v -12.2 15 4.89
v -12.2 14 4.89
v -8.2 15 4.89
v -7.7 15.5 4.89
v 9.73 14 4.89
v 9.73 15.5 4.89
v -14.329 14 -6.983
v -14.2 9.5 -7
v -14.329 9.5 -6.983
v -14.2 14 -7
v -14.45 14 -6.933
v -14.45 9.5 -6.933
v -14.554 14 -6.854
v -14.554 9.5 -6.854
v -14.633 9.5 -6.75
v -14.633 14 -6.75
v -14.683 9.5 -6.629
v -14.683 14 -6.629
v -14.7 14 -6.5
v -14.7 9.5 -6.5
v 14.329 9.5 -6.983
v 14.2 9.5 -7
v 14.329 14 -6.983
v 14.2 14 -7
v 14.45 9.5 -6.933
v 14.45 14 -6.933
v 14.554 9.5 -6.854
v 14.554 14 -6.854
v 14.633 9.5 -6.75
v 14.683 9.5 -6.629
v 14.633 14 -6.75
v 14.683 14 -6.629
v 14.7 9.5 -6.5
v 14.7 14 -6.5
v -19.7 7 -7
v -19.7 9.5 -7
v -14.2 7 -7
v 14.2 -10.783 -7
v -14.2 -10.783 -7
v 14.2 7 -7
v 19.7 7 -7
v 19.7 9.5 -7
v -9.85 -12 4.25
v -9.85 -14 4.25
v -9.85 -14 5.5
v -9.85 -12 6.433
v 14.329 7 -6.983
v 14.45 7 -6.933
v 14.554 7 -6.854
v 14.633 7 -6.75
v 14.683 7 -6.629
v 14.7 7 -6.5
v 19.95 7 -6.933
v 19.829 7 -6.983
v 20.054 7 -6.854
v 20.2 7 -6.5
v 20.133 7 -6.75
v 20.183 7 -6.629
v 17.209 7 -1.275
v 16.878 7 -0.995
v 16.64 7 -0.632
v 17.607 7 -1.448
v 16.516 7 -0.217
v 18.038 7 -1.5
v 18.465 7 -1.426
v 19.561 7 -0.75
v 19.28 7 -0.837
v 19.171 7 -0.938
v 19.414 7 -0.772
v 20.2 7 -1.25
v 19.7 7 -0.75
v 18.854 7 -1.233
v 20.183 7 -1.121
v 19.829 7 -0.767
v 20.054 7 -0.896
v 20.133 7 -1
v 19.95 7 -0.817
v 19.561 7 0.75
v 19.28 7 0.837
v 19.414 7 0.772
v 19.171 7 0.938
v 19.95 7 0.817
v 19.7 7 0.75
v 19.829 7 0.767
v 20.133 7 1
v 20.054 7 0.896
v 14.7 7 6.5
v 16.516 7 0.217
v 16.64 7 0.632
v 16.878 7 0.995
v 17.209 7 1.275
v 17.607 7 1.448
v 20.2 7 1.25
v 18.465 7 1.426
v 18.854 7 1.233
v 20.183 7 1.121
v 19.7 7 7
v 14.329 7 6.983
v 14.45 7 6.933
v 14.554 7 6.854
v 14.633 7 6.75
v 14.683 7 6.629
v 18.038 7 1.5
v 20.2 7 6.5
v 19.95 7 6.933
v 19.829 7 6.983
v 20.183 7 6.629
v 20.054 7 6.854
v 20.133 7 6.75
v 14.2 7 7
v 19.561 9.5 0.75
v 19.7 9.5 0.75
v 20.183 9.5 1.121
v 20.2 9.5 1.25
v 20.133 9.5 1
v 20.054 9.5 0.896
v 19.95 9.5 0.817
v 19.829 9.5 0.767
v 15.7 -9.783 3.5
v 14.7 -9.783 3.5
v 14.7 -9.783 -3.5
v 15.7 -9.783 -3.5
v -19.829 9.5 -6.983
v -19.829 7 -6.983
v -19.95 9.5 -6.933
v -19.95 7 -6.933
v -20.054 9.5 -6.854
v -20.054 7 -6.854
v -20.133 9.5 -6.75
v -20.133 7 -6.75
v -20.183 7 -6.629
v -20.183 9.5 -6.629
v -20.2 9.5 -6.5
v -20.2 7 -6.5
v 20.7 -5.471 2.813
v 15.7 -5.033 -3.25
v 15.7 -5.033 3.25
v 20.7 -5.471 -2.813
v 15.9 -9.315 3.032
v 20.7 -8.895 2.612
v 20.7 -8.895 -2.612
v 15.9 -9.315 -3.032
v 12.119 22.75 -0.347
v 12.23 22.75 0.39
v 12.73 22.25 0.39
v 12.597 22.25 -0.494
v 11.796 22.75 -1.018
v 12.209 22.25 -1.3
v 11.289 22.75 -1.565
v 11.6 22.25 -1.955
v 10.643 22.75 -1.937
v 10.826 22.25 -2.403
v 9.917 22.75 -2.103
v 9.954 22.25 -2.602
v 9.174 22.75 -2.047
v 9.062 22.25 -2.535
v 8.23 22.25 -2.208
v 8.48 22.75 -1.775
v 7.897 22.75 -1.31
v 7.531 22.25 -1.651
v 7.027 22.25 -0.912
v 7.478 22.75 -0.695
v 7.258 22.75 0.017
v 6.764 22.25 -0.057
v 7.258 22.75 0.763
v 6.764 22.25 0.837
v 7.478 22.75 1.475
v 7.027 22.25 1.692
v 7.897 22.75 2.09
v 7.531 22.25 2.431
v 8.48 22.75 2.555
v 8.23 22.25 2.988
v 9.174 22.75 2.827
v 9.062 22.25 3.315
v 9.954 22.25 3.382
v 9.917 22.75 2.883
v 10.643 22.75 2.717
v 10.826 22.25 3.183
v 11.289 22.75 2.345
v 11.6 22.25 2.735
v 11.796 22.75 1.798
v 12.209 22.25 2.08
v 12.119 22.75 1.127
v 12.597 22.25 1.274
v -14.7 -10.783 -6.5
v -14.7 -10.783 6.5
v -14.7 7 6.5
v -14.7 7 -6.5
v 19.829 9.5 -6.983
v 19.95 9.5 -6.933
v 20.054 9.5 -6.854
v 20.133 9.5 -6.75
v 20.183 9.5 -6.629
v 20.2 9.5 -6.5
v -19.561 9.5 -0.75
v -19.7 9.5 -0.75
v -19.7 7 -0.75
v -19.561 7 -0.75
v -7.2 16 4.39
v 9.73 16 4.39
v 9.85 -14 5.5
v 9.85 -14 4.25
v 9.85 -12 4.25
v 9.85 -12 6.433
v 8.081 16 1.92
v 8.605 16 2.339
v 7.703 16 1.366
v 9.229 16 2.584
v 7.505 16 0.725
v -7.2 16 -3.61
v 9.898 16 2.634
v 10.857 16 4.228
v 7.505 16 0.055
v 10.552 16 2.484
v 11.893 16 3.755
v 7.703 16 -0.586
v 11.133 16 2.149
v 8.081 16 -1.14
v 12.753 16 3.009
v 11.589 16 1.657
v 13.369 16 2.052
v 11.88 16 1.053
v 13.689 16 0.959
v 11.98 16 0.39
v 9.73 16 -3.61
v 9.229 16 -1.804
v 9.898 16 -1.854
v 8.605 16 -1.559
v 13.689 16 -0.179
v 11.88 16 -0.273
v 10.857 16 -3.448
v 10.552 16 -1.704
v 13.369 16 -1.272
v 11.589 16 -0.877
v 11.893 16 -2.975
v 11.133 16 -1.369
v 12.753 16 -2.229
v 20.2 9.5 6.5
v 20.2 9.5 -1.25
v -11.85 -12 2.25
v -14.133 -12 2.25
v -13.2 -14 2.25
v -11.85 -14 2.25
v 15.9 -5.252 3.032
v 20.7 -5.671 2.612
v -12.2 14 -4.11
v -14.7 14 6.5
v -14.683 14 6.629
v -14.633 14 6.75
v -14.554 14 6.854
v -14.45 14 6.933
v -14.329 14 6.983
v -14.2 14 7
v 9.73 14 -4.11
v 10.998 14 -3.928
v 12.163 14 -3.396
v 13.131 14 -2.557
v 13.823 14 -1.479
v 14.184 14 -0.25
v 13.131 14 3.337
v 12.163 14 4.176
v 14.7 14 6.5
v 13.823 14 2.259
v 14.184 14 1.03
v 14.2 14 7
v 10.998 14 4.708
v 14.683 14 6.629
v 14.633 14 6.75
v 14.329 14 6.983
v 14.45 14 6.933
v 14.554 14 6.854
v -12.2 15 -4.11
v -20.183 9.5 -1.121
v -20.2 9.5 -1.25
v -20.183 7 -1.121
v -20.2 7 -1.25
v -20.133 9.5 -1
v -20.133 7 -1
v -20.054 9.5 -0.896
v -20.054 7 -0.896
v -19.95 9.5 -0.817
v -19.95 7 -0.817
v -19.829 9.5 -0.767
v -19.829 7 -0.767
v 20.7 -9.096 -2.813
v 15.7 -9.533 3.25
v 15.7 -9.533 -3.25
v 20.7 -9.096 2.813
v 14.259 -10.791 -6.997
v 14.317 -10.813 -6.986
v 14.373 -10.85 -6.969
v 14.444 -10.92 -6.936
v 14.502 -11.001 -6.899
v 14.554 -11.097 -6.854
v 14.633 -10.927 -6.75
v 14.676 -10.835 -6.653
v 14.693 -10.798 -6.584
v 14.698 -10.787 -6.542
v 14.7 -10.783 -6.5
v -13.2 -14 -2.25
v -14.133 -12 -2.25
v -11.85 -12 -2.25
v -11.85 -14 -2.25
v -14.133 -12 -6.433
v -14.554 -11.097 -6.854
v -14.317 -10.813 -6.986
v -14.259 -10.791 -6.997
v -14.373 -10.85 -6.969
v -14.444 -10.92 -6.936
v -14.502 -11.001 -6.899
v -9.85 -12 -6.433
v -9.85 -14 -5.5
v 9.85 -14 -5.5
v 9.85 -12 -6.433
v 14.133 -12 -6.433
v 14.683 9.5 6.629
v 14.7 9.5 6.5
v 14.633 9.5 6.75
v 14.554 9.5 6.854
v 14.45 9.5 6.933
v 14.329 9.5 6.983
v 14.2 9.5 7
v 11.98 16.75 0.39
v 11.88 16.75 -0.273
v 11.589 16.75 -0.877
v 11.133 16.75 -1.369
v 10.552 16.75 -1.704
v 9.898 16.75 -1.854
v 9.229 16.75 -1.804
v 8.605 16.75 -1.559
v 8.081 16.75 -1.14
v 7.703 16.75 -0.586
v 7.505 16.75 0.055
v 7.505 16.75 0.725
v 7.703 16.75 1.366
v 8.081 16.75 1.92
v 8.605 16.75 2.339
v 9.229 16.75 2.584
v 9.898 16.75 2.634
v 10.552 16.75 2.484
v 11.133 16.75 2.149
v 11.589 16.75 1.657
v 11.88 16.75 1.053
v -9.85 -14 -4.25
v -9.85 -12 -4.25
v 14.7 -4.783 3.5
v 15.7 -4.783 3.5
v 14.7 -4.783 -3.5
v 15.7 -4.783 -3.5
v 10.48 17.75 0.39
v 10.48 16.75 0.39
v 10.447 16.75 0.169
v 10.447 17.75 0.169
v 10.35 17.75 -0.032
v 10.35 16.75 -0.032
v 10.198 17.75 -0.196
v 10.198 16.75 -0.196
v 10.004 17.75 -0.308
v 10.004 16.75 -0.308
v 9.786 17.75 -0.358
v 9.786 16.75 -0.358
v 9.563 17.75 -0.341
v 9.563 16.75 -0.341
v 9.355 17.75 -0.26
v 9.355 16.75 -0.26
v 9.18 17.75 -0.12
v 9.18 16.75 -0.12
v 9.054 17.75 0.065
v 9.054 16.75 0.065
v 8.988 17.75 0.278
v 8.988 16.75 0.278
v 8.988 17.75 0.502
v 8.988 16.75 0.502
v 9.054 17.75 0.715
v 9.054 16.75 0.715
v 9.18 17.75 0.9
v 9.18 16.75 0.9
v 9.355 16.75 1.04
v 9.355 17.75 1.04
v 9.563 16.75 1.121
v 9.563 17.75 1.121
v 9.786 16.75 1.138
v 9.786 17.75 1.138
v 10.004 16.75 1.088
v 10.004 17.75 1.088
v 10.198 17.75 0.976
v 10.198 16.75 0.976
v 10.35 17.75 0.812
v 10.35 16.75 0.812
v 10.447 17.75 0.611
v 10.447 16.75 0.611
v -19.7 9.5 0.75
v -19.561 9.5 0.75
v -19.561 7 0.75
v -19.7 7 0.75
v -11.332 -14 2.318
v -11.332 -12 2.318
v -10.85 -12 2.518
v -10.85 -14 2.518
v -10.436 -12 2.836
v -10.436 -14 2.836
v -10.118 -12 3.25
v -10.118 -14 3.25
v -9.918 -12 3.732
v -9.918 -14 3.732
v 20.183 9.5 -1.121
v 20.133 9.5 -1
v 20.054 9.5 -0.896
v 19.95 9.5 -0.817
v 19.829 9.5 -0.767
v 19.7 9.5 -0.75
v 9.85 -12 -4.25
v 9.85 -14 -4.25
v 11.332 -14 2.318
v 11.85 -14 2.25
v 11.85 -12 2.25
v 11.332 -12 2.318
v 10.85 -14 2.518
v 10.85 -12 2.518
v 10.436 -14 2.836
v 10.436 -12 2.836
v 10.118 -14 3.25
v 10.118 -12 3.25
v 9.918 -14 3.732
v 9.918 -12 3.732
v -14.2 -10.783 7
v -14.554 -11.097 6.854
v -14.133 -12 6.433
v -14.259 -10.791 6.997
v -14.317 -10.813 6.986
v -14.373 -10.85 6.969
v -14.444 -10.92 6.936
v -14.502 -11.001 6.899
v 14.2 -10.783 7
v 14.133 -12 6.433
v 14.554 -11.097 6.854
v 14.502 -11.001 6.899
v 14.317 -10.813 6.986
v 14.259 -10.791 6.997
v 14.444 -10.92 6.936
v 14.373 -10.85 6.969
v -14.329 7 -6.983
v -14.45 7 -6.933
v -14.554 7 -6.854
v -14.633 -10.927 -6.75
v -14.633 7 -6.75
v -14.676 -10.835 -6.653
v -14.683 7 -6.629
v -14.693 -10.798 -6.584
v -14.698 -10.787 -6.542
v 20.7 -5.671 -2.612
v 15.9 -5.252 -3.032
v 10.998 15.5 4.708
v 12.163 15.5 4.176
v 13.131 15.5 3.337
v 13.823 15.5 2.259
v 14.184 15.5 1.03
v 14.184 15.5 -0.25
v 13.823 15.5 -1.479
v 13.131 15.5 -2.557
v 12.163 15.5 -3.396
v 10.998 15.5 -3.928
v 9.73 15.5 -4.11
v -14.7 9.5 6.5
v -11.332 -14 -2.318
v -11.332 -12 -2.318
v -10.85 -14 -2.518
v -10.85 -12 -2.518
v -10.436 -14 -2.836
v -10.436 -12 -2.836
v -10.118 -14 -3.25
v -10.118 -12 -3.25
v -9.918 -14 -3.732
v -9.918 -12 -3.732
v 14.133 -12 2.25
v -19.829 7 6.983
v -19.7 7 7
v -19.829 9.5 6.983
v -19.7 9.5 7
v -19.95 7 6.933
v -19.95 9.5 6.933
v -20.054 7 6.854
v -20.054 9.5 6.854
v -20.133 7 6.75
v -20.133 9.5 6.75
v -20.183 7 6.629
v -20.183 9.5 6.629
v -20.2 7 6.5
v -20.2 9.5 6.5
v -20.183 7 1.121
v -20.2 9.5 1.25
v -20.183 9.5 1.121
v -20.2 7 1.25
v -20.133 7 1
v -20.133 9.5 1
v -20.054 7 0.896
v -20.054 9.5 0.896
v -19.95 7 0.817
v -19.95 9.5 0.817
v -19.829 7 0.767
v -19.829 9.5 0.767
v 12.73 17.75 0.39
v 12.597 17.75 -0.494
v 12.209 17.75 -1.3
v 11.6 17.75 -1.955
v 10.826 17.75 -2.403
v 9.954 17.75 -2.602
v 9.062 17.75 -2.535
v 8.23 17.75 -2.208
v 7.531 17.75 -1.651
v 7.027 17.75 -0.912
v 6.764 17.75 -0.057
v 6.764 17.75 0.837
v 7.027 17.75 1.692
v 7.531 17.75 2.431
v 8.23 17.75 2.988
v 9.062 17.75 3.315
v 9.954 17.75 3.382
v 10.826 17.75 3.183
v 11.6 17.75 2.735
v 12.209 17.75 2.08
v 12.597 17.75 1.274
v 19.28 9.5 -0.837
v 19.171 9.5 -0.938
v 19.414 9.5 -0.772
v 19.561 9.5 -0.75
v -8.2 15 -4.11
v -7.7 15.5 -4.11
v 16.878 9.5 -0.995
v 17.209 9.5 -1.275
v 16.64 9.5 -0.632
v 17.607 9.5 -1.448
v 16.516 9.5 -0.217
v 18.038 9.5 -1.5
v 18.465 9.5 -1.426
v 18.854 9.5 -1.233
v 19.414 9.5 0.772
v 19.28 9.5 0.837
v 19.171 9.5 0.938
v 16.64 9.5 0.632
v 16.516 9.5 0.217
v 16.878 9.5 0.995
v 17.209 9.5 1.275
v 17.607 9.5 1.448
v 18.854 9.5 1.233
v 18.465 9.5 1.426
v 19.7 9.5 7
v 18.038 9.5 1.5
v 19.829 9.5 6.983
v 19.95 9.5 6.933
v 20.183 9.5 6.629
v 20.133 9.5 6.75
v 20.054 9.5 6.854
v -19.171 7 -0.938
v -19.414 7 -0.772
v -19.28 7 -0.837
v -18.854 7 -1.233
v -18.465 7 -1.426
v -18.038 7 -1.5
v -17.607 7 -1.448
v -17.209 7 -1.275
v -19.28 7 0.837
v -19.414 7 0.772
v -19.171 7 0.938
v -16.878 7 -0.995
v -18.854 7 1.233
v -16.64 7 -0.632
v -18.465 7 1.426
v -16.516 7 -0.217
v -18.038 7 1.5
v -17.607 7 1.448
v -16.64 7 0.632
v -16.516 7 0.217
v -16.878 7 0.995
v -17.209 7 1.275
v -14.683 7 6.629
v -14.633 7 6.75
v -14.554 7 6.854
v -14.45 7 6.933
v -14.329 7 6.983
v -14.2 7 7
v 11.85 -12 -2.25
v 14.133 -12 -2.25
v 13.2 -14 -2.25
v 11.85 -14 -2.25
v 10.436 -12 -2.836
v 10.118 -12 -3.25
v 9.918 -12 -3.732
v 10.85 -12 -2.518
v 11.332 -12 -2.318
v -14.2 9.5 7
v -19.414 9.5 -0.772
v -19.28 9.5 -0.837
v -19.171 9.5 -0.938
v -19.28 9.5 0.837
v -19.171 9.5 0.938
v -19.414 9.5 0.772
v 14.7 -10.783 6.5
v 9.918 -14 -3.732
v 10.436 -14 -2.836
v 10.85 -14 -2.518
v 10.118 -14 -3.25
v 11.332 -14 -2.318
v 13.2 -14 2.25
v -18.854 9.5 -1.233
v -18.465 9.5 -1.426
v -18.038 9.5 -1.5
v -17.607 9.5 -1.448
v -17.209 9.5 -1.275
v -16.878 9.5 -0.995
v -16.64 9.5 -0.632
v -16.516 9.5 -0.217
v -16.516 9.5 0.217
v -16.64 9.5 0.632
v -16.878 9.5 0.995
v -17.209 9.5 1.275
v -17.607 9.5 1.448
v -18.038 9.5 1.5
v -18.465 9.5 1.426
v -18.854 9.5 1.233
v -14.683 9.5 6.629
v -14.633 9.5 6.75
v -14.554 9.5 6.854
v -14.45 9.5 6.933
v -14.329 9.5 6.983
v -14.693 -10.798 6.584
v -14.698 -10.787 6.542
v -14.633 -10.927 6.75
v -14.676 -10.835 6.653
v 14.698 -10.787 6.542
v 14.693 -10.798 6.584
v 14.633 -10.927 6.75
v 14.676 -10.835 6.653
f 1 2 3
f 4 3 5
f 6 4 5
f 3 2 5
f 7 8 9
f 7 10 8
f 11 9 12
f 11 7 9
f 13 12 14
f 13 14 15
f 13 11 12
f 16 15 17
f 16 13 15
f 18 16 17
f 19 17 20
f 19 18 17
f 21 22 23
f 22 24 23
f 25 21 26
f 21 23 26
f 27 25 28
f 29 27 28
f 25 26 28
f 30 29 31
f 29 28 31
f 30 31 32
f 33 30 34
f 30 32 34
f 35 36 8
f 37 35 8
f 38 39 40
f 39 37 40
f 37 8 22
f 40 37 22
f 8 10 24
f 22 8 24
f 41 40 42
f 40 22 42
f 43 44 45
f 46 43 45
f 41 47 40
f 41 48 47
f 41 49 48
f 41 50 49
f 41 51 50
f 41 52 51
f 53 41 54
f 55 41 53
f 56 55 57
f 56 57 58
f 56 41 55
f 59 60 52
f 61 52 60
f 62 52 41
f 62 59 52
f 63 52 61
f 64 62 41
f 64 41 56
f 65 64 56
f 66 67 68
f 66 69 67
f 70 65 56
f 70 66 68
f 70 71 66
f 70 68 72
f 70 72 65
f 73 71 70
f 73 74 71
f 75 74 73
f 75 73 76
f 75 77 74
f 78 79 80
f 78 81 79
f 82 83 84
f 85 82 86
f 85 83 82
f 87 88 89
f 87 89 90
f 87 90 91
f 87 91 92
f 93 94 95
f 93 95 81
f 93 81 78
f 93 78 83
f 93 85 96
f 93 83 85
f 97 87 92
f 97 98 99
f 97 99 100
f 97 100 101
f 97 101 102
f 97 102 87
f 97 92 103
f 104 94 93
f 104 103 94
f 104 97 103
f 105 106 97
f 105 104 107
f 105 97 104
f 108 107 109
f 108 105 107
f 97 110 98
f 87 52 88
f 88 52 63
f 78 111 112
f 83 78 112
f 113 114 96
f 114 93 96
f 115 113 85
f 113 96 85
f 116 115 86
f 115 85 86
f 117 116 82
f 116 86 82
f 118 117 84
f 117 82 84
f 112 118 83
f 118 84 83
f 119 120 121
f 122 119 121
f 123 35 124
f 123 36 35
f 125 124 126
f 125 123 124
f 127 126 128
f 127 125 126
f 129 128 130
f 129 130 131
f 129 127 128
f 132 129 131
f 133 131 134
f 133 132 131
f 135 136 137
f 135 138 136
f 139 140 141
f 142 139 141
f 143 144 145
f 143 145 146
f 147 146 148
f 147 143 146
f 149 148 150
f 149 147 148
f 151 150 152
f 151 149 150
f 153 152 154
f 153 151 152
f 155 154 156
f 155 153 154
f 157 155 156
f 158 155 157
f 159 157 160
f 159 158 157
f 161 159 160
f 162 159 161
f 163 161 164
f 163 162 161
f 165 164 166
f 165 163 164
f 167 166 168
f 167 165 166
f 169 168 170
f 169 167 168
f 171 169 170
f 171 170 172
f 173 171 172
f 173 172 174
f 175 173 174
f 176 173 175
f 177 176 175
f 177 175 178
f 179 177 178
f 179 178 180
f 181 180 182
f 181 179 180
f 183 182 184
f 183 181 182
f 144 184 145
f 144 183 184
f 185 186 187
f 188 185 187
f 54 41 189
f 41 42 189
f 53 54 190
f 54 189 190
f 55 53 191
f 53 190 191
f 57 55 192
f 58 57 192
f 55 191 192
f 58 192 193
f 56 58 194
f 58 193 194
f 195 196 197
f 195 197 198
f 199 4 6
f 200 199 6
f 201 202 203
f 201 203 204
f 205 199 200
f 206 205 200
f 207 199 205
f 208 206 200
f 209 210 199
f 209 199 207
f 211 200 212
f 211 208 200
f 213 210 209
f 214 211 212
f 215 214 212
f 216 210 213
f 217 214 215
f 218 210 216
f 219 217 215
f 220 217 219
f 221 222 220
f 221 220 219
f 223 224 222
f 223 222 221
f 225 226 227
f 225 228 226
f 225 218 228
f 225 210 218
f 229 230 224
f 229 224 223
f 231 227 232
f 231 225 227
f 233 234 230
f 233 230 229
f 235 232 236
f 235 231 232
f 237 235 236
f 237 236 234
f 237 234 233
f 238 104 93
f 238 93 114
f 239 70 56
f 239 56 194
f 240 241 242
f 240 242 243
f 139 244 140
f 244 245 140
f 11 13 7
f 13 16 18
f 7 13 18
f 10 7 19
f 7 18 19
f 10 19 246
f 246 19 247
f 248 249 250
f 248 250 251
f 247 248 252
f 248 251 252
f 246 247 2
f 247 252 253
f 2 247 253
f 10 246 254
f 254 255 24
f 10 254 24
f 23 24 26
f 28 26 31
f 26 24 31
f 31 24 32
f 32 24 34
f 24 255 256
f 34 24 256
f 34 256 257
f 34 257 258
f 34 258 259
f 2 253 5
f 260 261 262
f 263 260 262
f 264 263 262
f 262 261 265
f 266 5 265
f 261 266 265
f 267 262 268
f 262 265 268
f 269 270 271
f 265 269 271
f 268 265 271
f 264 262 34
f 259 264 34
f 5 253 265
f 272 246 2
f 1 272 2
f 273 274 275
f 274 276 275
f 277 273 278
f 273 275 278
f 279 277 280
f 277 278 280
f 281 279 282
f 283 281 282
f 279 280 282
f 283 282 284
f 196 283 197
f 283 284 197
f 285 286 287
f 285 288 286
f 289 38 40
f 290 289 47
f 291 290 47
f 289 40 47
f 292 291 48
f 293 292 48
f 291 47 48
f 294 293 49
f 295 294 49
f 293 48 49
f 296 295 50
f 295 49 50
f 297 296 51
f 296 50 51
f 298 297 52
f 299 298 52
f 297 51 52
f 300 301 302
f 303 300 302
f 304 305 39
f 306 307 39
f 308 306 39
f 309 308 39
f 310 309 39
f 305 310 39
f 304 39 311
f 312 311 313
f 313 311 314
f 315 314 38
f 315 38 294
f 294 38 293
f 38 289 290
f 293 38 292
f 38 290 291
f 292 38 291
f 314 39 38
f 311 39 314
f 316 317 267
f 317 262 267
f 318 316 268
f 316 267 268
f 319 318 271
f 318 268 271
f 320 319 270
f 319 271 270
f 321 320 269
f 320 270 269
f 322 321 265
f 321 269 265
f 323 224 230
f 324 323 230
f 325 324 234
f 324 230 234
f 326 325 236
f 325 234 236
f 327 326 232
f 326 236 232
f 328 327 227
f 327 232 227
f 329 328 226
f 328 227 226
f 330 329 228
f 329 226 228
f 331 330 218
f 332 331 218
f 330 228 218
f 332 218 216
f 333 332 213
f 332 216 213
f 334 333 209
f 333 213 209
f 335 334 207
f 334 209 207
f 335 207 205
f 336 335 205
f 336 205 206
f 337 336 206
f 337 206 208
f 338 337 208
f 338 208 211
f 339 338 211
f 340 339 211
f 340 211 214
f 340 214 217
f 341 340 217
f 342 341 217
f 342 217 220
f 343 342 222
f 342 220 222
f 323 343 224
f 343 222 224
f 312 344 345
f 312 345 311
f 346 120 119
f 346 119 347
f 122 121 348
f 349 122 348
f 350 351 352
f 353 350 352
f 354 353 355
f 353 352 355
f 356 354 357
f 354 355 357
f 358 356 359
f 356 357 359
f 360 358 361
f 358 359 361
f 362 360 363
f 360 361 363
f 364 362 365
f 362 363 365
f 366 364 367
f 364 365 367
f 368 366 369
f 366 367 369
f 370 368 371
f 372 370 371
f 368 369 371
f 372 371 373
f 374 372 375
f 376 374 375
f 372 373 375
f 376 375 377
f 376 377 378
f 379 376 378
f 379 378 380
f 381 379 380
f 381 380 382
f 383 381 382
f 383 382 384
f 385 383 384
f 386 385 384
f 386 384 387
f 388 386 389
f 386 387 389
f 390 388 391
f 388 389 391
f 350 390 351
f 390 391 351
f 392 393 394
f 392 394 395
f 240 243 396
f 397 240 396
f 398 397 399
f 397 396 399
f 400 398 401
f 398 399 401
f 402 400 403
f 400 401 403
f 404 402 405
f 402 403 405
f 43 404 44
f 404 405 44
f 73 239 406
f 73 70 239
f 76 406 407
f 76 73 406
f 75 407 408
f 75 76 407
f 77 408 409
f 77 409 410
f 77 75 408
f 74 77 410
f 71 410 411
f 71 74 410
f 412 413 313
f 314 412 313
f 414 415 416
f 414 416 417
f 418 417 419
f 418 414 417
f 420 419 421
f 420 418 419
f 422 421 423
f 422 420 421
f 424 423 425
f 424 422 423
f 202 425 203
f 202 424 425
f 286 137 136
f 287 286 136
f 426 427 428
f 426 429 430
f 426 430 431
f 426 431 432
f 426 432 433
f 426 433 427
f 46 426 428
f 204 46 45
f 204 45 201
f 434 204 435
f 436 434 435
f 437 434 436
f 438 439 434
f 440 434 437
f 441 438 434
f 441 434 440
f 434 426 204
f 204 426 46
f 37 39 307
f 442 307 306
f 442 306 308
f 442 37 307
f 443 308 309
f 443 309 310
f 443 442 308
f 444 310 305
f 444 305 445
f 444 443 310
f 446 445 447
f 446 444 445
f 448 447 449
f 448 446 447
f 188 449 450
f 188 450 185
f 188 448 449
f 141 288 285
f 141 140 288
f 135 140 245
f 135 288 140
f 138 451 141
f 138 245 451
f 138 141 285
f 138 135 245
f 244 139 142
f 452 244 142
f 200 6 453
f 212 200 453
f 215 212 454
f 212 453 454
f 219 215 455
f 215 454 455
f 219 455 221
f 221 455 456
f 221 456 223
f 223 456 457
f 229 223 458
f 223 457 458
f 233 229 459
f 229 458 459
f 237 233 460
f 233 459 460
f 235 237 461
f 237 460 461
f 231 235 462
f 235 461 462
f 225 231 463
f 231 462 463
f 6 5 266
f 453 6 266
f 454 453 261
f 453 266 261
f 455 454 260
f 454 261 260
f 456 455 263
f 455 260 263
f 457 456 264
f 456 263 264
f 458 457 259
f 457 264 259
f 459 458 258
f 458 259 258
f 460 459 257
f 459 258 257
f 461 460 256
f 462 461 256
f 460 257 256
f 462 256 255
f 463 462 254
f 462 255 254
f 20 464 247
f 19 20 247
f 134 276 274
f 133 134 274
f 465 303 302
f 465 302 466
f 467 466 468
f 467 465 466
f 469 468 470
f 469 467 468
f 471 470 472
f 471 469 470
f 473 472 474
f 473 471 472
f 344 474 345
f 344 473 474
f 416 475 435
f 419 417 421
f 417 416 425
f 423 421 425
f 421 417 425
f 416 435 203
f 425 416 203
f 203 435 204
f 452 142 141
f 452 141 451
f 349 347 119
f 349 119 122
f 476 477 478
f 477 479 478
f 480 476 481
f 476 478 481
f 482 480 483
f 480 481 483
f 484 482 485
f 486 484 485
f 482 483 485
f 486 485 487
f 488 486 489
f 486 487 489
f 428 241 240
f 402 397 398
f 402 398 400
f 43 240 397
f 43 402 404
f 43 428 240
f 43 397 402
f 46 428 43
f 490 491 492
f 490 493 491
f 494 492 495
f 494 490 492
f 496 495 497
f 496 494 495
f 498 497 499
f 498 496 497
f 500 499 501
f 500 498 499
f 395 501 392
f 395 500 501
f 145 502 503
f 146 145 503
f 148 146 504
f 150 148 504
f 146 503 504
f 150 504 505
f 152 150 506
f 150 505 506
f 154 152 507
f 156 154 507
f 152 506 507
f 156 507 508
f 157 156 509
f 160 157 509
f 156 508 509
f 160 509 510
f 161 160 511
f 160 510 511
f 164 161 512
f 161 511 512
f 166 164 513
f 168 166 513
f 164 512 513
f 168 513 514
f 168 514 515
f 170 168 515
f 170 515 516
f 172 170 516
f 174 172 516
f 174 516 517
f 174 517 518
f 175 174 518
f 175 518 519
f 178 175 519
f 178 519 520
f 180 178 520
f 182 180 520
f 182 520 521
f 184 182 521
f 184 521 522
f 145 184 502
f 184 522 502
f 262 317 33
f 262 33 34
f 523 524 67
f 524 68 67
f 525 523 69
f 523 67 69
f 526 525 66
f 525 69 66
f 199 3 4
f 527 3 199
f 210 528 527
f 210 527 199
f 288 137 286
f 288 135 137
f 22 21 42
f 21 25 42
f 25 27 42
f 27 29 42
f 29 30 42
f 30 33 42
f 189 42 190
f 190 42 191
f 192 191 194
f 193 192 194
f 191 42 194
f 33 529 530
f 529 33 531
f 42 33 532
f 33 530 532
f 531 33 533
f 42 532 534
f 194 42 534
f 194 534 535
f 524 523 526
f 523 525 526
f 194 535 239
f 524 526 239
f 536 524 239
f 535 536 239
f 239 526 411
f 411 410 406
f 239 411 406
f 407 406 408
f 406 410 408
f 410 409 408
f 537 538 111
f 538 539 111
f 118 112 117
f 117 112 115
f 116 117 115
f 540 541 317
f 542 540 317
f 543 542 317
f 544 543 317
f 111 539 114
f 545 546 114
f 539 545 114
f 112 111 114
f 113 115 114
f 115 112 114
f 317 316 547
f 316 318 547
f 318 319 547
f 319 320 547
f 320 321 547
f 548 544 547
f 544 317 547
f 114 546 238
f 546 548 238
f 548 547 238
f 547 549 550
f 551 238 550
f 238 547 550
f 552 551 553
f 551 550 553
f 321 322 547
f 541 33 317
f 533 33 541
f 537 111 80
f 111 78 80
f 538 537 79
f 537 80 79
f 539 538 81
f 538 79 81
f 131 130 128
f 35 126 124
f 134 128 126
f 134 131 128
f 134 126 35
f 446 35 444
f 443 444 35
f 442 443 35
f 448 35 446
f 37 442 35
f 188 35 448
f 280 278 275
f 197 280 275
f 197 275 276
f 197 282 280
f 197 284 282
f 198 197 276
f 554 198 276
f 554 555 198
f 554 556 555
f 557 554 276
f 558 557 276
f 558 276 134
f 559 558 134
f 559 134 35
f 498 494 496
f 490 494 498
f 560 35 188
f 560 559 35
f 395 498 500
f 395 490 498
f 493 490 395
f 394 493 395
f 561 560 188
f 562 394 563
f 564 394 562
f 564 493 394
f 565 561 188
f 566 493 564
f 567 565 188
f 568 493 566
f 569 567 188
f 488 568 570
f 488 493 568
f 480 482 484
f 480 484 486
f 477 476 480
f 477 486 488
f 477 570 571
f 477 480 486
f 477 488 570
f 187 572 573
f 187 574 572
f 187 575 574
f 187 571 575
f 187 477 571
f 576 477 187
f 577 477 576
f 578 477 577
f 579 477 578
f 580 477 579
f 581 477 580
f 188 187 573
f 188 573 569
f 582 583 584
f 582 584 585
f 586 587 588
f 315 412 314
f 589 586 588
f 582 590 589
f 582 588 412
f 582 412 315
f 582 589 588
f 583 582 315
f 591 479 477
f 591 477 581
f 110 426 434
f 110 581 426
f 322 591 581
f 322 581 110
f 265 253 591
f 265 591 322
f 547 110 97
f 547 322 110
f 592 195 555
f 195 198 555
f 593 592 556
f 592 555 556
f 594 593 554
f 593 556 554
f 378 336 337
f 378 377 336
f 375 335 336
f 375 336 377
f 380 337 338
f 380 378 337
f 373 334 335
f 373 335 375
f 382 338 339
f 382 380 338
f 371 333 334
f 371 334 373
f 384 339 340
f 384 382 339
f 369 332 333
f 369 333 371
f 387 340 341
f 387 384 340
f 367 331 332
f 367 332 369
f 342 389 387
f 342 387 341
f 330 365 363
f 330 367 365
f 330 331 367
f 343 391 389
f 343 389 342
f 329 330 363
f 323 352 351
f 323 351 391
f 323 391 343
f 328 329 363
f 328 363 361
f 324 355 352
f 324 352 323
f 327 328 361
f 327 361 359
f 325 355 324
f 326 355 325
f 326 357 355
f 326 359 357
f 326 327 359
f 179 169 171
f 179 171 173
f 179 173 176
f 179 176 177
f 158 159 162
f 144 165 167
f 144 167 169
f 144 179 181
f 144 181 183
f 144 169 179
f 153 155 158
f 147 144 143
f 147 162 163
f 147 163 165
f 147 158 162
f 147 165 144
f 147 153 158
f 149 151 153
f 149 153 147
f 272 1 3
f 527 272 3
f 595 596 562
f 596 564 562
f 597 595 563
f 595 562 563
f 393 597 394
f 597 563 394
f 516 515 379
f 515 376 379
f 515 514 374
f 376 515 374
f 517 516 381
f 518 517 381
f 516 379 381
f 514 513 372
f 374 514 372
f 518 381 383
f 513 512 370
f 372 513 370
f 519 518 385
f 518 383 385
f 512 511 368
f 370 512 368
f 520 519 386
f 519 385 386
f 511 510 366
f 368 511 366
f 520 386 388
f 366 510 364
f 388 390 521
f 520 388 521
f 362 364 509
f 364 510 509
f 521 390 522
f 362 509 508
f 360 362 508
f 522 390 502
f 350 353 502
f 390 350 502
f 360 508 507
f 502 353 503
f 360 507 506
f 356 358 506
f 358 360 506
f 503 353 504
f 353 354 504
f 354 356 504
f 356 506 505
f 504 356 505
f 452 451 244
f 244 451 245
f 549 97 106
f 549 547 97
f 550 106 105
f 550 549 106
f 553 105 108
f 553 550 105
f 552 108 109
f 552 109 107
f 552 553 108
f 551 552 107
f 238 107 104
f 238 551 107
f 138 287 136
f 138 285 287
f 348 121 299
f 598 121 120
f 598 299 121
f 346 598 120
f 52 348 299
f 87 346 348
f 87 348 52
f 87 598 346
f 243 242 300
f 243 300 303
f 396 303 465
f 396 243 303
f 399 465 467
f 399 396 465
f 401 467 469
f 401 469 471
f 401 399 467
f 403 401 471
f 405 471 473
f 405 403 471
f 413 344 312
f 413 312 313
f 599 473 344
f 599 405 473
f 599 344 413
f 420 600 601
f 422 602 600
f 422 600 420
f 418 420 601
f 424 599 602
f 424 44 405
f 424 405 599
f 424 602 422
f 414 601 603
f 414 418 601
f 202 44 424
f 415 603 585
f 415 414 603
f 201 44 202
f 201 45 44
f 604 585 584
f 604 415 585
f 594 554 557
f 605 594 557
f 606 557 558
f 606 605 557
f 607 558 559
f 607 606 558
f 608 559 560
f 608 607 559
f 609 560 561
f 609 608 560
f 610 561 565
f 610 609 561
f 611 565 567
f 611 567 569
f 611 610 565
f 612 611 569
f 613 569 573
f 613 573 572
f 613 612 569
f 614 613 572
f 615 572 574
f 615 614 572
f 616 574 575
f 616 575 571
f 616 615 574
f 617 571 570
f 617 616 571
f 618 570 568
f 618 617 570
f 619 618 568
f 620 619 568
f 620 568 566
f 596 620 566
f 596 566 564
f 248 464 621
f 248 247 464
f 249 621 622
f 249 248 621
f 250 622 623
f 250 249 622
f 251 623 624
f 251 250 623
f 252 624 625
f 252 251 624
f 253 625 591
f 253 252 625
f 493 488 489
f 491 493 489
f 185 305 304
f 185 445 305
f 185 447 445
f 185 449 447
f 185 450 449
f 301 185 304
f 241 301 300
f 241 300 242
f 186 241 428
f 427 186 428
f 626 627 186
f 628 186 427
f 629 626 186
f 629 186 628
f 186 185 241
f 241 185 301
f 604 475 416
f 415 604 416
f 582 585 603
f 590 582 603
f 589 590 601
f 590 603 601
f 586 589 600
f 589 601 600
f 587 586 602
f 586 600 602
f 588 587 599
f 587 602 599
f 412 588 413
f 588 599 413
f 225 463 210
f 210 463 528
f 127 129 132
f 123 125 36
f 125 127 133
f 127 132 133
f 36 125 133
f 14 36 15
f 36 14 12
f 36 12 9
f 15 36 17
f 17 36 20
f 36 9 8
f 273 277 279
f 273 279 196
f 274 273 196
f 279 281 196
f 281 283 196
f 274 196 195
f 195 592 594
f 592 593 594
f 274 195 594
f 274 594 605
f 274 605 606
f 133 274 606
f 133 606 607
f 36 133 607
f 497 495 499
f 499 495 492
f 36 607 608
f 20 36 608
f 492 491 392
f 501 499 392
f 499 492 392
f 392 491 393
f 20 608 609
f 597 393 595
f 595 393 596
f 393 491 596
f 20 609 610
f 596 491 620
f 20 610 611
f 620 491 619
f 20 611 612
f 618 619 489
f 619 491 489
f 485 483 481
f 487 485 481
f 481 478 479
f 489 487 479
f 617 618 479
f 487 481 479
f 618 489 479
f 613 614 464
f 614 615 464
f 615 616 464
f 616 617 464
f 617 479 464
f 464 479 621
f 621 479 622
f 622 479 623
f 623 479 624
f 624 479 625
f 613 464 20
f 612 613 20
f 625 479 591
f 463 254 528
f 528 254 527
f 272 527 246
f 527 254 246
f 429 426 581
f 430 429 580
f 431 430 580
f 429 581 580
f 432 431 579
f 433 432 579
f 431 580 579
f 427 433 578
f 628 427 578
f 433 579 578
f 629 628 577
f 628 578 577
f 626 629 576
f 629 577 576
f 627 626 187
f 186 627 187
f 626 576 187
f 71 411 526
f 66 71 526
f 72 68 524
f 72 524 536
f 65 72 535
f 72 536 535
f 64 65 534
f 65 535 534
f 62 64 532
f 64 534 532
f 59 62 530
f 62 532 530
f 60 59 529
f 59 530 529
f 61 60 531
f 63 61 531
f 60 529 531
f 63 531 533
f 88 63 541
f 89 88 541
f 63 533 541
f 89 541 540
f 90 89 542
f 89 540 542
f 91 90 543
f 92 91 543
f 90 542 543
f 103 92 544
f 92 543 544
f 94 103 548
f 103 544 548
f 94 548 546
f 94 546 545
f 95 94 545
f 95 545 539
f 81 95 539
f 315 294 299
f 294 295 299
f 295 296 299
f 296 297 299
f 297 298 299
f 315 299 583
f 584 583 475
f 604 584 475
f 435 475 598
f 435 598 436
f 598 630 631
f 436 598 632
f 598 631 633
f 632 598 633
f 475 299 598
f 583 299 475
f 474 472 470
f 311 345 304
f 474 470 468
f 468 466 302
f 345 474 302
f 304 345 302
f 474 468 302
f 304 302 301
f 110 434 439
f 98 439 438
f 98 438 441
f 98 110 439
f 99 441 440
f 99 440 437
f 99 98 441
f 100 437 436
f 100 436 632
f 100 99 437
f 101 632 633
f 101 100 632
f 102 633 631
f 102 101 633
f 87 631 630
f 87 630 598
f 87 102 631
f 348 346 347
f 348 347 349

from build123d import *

# Parameters (mm, degrees)
CROQUIS1_W              = 29.4
CROQUIS1_H              = 28
SALIENTE_EXTRUIR1_DEPTH = 7
CROQUIS2_W              = 5.5
CROQUIS2_H              = 2.5
SALIENTE_EXTRUIR2_DEPTH = 14
CORTAR_EXTRUIR1_DEPTH   = 2.5
CHAFL_N1_SIZE           = 1.5
CHAFL_N1_SIZE2          = 3.216760381
CORTAR_EXTRUIR2_DEPTH   = 2
SALIENTE_EXTRUIR4_DEPTH = 2
CORTAR_EXTRUIR3_START   = -9
CORTAR_EXTRUIR3_DEPTH   = 9
CROQUIS10_R             = 2.25
SALIENTE_EXTRUIR5_DEPTH = 0.75
CROQUIS11_R             = 0.75
SALIENTE_EXTRUIR6_DEPTH = 1
CROQUIS12_R             = 3
SALIENTE_EXTRUIR7_DEPTH = 5
CROQUIS14_W             = 7
CROQUIS14_H             = 5
SALIENTE_EXTRUIR8_DEPTH = 1
CROQUIS15_W             = 6.5
CROQUIS15_H             = 4.5
SALIENTE_EXTRUIR9_DEPTH = 5
SALIENTE_EXTRUIR9_TAPER = 5
VACIADO2_T              = -0.2
CHAFL_N2_SIZE           = 0.5
FILLET1_R               = 0.5


with BuildPart() as part:
    # Croquis1 → Saliente-Extruir1 (new body, symmetric)
    with BuildSketch(Plane.XY):
        Rectangle(CROQUIS1_W, CROQUIS1_H)
    extrude(amount=SALIENTE_EXTRUIR1_DEPTH, both=True)

    # Croquis2 → Saliente-Extruir2 (add)
    with BuildSketch(Plane.XY.offset(7)):
        with Locations((-17.45, 8.25)):
            Rectangle(CROQUIS2_W, CROQUIS2_H)
        with Locations((17.45, 8.25)):
            Rectangle(CROQUIS2_W, CROQUIS2_H)
    extrude(amount=-SALIENTE_EXTRUIR2_DEPTH)

    # Croquis4 → Cortar-Extruir1 (cut)
    with BuildSketch(Plane(origin=(0, 9.5, 0), x_dir=(1, 0, 0), z_dir=(0, 1, 0))):
        with BuildLine():
            Line((-20.2, 0.75), (-19.299038106, 0.75))
            ThreePointArc((-19.299038106, 0.75), (-16.5, 0), (-19.299038106, -0.75))
            Line((-19.299038106, -0.75), (-20.2, -0.75))
            Line((-20.2, -0.75), (-20.2, 0.75))
        make_face()
        with BuildLine():
            Line((20.2, -0.75), (20.2, 0.75))
            Line((20.2, 0.75), (19.299038106, 0.75))
            ThreePointArc((19.299038106, 0.75), (16.5, 0), (19.299038106, -0.75))
            Line((19.299038106, -0.75), (20.2, -0.75))
        make_face()
    extrude(amount=-CORTAR_EXTRUIR1_DEPTH, mode=Mode.SUBTRACT)

    # Chaflán1
    chafl_n1_edges = [part.edges().sort_by_distance(p)[0] for p in [
        (0, -14, -7),
        (0, -14, 7),
        (-14.7, -14, 0),
        (14.7, -14, 0),
    ]]
    chafl_n1_side = [part.faces().sort_by_distance(p)[0] for p in [
        (0, -14, 0),
    ]]
    chamfer(chafl_n1_edges, length=CHAFL_N1_SIZE, length2=CHAFL_N1_SIZE2, reference=chafl_n1_side[0])

    # Croquis5 → Cortar-Extruir2 (cut)
    with BuildSketch(Plane.XZ.offset(14)):
        with BuildLine():
            Line((-14.7, 2.25), (-11.85, 2.25))
            ThreePointArc((-11.85, 2.25), (-10.435786438, 2.835786438), (-9.85, 4.25))
            Line((-9.85, 4.25), (-9.85, 7))
            Line((-9.85, 7), (-14.7, 7))
            Line((-14.7, 7), (-14.7, 2.25))
        make_face()
        with BuildLine():
            Line((-14.7, -7), (-14.7, -2.25))
            Line((-14.7, -2.25), (-11.85, -2.25))
            ThreePointArc((-11.85, -2.25), (-10.435786438, -2.835786438), (-9.85, -4.25))
            Line((-9.85, -4.25), (-9.85, -7))
            Line((-9.85, -7), (-14.7, -7))
        make_face()
        with BuildLine():
            Line((14.7, -2.25), (11.85, -2.25))
            ThreePointArc((11.85, -2.25), (10.435786438, -2.835786438), (9.85, -4.25))
            Line((9.85, -4.25), (9.85, -7))
            Line((9.85, -7), (14.7, -7))
            Line((14.7, -7), (14.7, -2.25))
        make_face()
        with BuildLine():
            Line((14.7, 7), (14.7, 2.25))
            Line((14.7, 2.25), (11.85, 2.25))
            ThreePointArc((11.85, 2.25), (10.435786438, 2.835786438), (9.85, 4.25))
            Line((9.85, 4.25), (9.85, 7))
            Line((9.85, 7), (14.7, 7))
        make_face()
    extrude(amount=-CORTAR_EXTRUIR2_DEPTH, mode=Mode.SUBTRACT)

    # Croquis6 → Saliente-Extruir4 (add)
    with BuildSketch(Plane(origin=(0, 14, 0), x_dir=(1, 0, 0), z_dir=(0, 1, 0))):
        with BuildLine():
            Line((9.73, 4.11), (-12.2, 4.11))
            Line((-12.2, 4.11), (-12.2, -4.89))
            Line((-12.2, -4.89), (9.73, -4.89))
            ThreePointArc((9.73, -4.89), (14.23, -0.39), (9.73, 4.11))
        make_face()
    extrude(amount=SALIENTE_EXTRUIR4_DEPTH)

    # Croquis9 → Cortar-Extruir3 (cut)
    with BuildSketch(Plane.XY.offset(4.89).offset(CORTAR_EXTRUIR3_START)):
        Polygon((-12.2, 16), (-12.2, 15), (-8.2, 15), (-7.2, 16), align=None)
    extrude(amount=CORTAR_EXTRUIR3_DEPTH, mode=Mode.SUBTRACT)

    # Croquis10 → Saliente-Extruir5 (add)
    with BuildSketch(Plane(origin=(0, 16, 0), x_dir=(1, 0, 0), z_dir=(0, 1, 0))):
        with Locations((9.73, -0.39)):
            Circle(CROQUIS10_R)
    extrude(amount=SALIENTE_EXTRUIR5_DEPTH)

    # Croquis11 → Saliente-Extruir6 (add)
    with BuildSketch(Plane(origin=(0, 16.75, 0), x_dir=(1, 0, 0), z_dir=(0, 1, 0))):
        with Locations((9.73, -0.39)):
            Circle(CROQUIS11_R)
    extrude(amount=SALIENTE_EXTRUIR6_DEPTH)

    # Croquis12 → Saliente-Extruir7 (add)
    with BuildSketch(Plane(origin=(0, 17.75, 0), x_dir=(1, 0, 0), z_dir=(0, 1, 0))):
        with Locations((9.73, -0.39)):
            Circle(CROQUIS12_R)
    extrude(amount=SALIENTE_EXTRUIR7_DEPTH)

    # Croquis14 → Saliente-Extruir8 (add)
    with BuildSketch(Plane(origin=(14.7, 0, 0), x_dir=(0, 0, -1), z_dir=(1, 0, 0))):
        with Locations((0, -7.283239619)):
            Rectangle(CROQUIS14_W, CROQUIS14_H)
    extrude(amount=SALIENTE_EXTRUIR8_DEPTH)

    # Chaflán2
    chafl_n2_edges = [part.edges().sort_by_distance(p)[0] for p in [
        (14.23, 16, 0.39),
        (1.265, 16, -4.11),
        (1.265, 16, 4.89),
        (6.73, 22.75, 0.39),
    ]]
    chamfer(chafl_n2_edges, length=CHAFL_N2_SIZE)

    # Fillet1
    fillet1_edges = [part.edges().sort_by_distance(p)[0] for p in [
        (14.7, 11.75, -7),
        (14.7, 11.75, 7),
        (14.7, -1.89161981, 7),
        (14.7, -1.89161981, -7),
        (20.2, 8.25, -7),
        (19.299038106, 8.25, 0.75),
        (19.299038106, 8.25, -0.75),
        (20.2, 8.25, -0.75),
        (20.2, 8.25, 0.75),
        (20.2, 8.25, 7),
        (-19.299038106, 8.25, -0.75),
        (-20.2, 8.25, 7),
        (-14.7, 11.75, -7),
        (-14.7, 11.75, 7),
        (-14.7, -1.89161981, 7),
        (-19.299038106, 8.25, 0.75),
        (-20.2, 8.25, 0.75),
        (-20.2, 8.25, -0.75),
        (-20.2, 8.25, -7),
        (-14.7, -1.89161981, -7),
    ]]
    fillet(fillet1_edges, radius=FILLET1_R)


with BuildPart() as body_2:
    # Croquis15 → Saliente-Extruir9 (new body)
    with BuildSketch(Plane(origin=(15.7, 0, 0), x_dir=(0, 0, -1), z_dir=(1, 0, 0))):
        with Locations((0, -7.283239619)):
            Rectangle(CROQUIS15_W, CROQUIS15_H)
    extrude(amount=SALIENTE_EXTRUIR9_DEPTH, taper=SALIENTE_EXTRUIR9_TAPER)

    # Vaciado2
    vaciado2_openings = [body_2.faces().sort_by_distance(p)[0] for p in [
        (20.7, -7.283239619, 0),
    ]]
    offset(amount=VACIADO2_T, openings=vaciado2_openings, kind=Kind.INTERSECTION)


solid = Compound([part.part, body_2.part])
